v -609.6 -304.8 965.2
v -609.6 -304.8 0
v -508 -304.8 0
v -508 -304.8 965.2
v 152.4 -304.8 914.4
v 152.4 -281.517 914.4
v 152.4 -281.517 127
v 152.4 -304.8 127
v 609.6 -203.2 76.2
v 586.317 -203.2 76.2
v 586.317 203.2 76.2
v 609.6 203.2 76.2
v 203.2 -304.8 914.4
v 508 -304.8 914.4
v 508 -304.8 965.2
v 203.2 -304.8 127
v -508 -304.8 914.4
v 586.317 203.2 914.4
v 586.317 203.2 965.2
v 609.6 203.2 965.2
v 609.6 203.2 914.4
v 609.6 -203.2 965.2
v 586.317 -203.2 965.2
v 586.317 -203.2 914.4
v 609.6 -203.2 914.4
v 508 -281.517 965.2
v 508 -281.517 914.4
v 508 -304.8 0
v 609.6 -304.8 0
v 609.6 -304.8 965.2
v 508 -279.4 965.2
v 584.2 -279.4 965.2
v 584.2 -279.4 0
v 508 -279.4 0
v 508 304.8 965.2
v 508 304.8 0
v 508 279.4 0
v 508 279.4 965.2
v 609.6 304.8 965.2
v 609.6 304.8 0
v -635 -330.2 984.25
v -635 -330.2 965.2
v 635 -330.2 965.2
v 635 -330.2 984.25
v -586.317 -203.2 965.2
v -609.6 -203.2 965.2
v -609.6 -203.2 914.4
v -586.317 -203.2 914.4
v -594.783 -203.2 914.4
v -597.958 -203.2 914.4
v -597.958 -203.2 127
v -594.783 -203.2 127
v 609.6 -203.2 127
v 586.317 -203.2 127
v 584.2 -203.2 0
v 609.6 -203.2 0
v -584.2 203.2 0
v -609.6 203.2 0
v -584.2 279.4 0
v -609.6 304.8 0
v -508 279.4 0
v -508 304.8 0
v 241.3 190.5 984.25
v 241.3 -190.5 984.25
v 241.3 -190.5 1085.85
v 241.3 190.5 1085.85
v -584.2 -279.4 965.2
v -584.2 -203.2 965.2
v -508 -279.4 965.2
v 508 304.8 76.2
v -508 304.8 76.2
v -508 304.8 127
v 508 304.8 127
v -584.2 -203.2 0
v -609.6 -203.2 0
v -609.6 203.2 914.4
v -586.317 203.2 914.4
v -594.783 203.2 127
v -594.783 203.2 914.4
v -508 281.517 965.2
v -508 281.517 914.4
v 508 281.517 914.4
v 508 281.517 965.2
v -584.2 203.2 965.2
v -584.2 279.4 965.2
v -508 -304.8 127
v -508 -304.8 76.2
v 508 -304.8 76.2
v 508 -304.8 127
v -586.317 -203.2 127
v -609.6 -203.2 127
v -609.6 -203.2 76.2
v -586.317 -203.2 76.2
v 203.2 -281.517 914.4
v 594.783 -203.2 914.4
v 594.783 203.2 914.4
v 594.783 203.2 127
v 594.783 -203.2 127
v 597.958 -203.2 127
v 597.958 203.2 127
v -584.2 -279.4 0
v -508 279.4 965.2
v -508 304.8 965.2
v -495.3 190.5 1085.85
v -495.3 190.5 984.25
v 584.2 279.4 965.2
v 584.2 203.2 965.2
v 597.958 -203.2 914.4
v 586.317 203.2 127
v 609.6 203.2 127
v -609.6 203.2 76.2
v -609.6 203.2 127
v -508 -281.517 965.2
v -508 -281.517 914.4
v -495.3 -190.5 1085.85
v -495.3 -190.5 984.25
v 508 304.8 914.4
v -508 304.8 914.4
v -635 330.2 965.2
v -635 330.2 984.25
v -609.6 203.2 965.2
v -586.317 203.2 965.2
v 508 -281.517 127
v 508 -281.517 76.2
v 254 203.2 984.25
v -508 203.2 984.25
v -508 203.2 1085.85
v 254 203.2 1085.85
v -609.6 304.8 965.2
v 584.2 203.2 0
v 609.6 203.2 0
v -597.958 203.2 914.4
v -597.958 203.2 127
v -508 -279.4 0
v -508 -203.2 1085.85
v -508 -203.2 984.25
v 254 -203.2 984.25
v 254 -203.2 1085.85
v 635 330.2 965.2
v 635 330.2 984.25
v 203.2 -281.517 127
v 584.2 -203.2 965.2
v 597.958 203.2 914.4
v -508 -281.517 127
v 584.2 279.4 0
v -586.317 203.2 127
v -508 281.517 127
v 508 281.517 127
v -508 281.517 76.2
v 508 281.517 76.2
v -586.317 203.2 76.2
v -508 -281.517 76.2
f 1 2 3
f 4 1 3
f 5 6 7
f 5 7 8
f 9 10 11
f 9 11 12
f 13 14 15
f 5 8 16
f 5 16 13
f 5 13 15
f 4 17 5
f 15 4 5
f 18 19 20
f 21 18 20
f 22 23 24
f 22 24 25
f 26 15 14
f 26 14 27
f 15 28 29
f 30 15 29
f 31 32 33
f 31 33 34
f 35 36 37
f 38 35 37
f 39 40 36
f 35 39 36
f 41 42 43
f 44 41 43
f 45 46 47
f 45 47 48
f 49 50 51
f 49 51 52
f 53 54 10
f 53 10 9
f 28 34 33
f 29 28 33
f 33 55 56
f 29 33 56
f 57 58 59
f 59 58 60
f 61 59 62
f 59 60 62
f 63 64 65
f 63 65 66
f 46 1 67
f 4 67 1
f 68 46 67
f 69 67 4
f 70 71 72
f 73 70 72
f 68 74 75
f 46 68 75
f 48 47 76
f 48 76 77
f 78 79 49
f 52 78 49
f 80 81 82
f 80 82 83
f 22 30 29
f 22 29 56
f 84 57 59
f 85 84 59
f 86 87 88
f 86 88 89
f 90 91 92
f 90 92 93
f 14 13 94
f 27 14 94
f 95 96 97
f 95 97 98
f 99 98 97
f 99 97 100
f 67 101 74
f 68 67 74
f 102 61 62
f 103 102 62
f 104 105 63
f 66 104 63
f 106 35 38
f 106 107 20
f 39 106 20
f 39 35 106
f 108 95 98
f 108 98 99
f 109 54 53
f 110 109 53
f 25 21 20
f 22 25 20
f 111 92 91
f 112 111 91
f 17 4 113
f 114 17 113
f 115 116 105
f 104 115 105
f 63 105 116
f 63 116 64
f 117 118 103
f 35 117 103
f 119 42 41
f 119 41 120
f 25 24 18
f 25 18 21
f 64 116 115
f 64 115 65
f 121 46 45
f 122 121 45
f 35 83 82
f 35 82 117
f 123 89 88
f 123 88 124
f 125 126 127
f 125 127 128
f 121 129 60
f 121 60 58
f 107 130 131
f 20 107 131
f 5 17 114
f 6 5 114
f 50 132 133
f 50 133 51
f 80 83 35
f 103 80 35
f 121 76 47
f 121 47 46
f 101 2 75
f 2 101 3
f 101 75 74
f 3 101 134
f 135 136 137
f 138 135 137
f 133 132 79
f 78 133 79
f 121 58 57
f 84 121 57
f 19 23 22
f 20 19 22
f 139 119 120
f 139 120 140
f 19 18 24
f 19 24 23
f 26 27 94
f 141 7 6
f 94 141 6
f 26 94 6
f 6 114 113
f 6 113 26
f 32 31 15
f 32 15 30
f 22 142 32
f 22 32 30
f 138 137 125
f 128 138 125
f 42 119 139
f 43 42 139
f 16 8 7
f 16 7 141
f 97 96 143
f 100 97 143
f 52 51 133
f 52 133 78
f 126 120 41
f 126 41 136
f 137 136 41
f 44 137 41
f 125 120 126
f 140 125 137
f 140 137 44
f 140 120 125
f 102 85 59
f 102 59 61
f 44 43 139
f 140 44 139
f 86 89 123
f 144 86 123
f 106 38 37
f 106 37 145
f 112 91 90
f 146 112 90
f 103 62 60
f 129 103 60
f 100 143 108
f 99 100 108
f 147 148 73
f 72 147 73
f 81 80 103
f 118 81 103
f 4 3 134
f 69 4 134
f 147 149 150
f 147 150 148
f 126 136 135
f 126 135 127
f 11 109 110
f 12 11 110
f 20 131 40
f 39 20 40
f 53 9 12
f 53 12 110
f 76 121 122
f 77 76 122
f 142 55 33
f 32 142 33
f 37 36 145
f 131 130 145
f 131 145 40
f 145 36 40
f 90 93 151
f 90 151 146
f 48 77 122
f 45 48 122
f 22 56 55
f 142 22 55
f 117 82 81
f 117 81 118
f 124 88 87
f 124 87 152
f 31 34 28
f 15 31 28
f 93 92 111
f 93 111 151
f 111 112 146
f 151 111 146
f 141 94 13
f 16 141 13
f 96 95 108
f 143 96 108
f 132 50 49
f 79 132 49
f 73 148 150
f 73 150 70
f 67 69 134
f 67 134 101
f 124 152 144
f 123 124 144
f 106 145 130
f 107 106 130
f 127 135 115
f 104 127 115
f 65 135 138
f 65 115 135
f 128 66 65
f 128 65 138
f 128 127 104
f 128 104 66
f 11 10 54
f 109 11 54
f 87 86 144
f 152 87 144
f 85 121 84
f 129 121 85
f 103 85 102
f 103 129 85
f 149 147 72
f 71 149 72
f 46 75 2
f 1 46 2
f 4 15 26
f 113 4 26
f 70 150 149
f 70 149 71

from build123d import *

# Parameters (mm, degrees)
F1_DEPTH  = 965.2
F2_W      = 23.2833333333
F2_H      = 50.8
F3_DEPTH  = 406.4
F4_W      = 23.2833333333
F4_H      = 50.8
F5_DEPTH  = 1016
F6_W      = 1270
F6_H      = 660.4
F7_DEPTH  = 19.05
F8_W      = 3.175
F8_H      = 406.4
F9_DEPTH  = 787.4
F10_W     = 50.8
F10_H     = 23.2833333333
F11_DEPTH = 787.4
F12_W     = 762
F12_H     = 406.4
F12_W_2   = 736.6
F12_H_2   = 381
F13_DEPTH = 101.6


with BuildPart() as f1:
    # F0 (on Top) → F1 (new body)
    with BuildSketch(Plane.XY):
        Polygon((-508, 304.8), (-609.6, 304.8), (-609.6, 203.2), (-584.2, 203.2), (-584.2, 279.4), (-508, 279.4), align=None)
    extrude(amount=F1_DEPTH)


with BuildPart() as f1b:
    # F0 (on Top) → F1, piece 2 (new body)
    with BuildSketch(Plane.XY):
        Polygon((609.6, 304.8), (508, 304.8), (508, 279.4), (584.2, 279.4), (584.2, 203.2), (609.6, 203.2), align=None)
    extrude(amount=F1_DEPTH)


with BuildPart() as f1c:
    # F0 (on Top) → F1, piece 3 (new body)
    with BuildSketch(Plane.XY):
        Polygon((508, -279.4), (508, -304.8), (609.6, -304.8), (609.6, -203.2), (584.2, -203.2), (584.2, -279.4), align=None)
    extrude(amount=F1_DEPTH)


with BuildPart() as f1d:
    # F0 (on Top) → F1, piece 4 (new body)
    with BuildSketch(Plane.XY):
        Polygon((-609.6, -304.8), (-508, -304.8), (-508, -279.4), (-584.2, -279.4), (-584.2, -203.2), (-609.6, -203.2), align=None)
    extrude(amount=F1_DEPTH)


with BuildPart() as f3:
    # F2 (on face) → F3 (new body, through all)
    with BuildSketch(Plane.XZ.offset(-203.2)):
        with Locations((-597.9583333333, 939.8)):
            Rectangle(F2_W, F2_H)
    extrude(amount=F3_DEPTH)


with BuildPart() as f3b:
    # F2 (on face) → F3, piece 2 (new body, through all)
    with BuildSketch(Plane.XZ.offset(-203.2)):
        with Locations((597.9583333333, 939.8)):
            Rectangle(F2_W, F2_H)
    extrude(amount=F3_DEPTH)


with BuildPart() as f3c:
    # F2 (on face) → F3, piece 3 (new body, through all)
    with BuildSketch(Plane.XZ.offset(-203.2)):
        with Locations((-597.9583333333, 101.6)):
            Rectangle(F2_W, F2_H)
    extrude(amount=F3_DEPTH)


with BuildPart() as f3d:
    # F2 (on face) → F3, piece 4 (new body, through all)
    with BuildSketch(Plane.XZ.offset(-203.2)):
        with Locations((597.9583333333, 101.6)):
            Rectangle(F2_W, F2_H)
    extrude(amount=F3_DEPTH)


with BuildPart() as f5:
    # F4 (on face) → F5 (new body, through all)
    with BuildSketch(Plane.YZ.offset(-508)):
        with Locations((293.1583333333, 939.8)):
            Rectangle(F4_W, F4_H)
    extrude(amount=F5_DEPTH)


with BuildPart() as f5b:
    # F4 (on face) → F5, piece 2 (new body, through all)
    with BuildSketch(Plane.YZ.offset(-508)):
        with Locations((293.1583333333, 101.6)):
            Rectangle(F4_W, F4_H)
    extrude(amount=F5_DEPTH)


with BuildPart() as f5c:
    # F4 (on face) → F5, piece 3 (new body, through all)
    with BuildSketch(Plane.YZ.offset(-508)):
        with Locations((-293.1583333333, 101.6)):
            Rectangle(F4_W, F4_H)
    extrude(amount=F5_DEPTH)


with BuildPart() as f5d:
    # F4 (on face) → F5, piece 4 (new body, through all)
    with BuildSketch(Plane.YZ.offset(-508)):
        with Locations((-293.1583333333, 939.8)):
            Rectangle(F4_W, F4_H)
    extrude(amount=F5_DEPTH)

    # F10 (on face) → F11 (join, through all)
    with BuildSketch(Plane(origin=(0, 0, 914.4), x_dir=(1, 0, 0), z_dir=(0, 0, -1))):
        with Locations((177.8, 293.1583333333)):
            Rectangle(F10_W, F10_H)
    extrude(amount=F11_DEPTH)


with BuildPart() as f7:
    # F6 (on face) → F7 (new body)
    with BuildSketch(Plane.XY.offset(965.2)):
        Rectangle(F6_W, F6_H)
    extrude(amount=F7_DEPTH)

    # F12 (on face) → F13 (join)
    with BuildSketch(Plane.XY.offset(984.25)):
        with Locations((-127, 0)):
            Rectangle(F12_W, F12_H)
        with Locations((-127, 0)):
            Rectangle(F12_W_2, F12_H_2, mode=Mode.SUBTRACT)
    extrude(amount=F13_DEPTH)


with BuildPart() as f9:
    # F8 (on face) → F9 (new body, through all)
    with BuildSketch(Plane(origin=(0, 0, 914.4), x_dir=(1, 0, 0), z_dir=(0, 0, -1))):
        with Locations((-596.3708333333, 0)):
            Rectangle(F8_W, F8_H)
    extrude(amount=F9_DEPTH)


with BuildPart() as f9b:
    # F8 (on face) → F9, piece 2 (new body, through all)
    with BuildSketch(Plane(origin=(0, 0, 914.4), x_dir=(1, 0, 0), z_dir=(0, 0, -1))):
        with Locations((596.3708333333, 0)):
            Rectangle(F8_W, F8_H)
    extrude(amount=F9_DEPTH)


solid = Compound([f1.part, f1b.part, f1c.part, f1d.part, f3.part, f3b.part, f3c.part, f3d.part, f5.part, f5b.part, f5c.part, f5d.part, f7.part, f9.part, f9b.part])
